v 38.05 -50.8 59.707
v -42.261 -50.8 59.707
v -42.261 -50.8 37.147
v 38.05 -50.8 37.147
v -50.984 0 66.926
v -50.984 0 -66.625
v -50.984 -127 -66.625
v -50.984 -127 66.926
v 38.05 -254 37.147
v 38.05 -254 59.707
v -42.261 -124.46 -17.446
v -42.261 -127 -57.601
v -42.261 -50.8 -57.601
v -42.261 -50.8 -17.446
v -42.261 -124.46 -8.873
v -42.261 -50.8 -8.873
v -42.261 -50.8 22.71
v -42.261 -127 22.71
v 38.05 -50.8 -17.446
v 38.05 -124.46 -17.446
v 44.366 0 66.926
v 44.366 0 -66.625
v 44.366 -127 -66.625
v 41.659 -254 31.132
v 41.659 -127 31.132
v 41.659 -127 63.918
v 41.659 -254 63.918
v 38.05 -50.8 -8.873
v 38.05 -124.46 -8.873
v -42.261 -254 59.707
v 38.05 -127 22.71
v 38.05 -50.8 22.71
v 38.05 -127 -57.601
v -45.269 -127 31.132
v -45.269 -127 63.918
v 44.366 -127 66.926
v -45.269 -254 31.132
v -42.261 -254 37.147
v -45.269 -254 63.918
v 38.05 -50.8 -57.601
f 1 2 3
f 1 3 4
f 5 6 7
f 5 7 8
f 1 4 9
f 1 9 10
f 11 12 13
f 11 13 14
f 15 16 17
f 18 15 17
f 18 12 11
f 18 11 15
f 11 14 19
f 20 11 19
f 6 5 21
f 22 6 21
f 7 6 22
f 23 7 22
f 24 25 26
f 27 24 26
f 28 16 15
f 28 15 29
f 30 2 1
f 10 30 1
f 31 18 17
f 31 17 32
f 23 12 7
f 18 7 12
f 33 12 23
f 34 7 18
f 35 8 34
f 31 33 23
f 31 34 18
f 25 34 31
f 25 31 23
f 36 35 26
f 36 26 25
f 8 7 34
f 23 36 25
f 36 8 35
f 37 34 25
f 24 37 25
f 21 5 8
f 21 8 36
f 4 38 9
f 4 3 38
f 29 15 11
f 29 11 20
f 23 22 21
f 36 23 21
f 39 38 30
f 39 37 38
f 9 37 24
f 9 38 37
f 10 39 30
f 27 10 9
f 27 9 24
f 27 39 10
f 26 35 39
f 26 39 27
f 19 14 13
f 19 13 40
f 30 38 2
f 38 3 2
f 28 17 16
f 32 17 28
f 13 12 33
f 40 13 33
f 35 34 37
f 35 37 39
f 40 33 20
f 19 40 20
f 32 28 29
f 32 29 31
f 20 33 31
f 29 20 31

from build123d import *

# Parameters (mm, degrees)
F0_W     = 95.3502617776
F0_H     = 133.5505247116
F1_DEPTH = 127
F2_W     = 80.3107917309
F2_H     = 22.5592143834
F2_H_2   = 80.3107880056
F3_DEPTH = 76.2
F4_W     = 80.3107917309
F4_H     = 8.5725001991
F5_DEPTH = 73.66
F6_W     = 86.9281552732
F6_H     = 32.7860526741
F6_W_2   = 80.3107917309
F6_H_2   = 22.5592143834
F7_DEPTH = 127


with BuildPart() as f1:
    # F0 (on Front) → F1 (new body)
    with BuildSketch(Plane.XZ):
        with Locations((-3.3086854964, 0.1503974199)):
            Rectangle(F0_W, F0_H)
    extrude(amount=F1_DEPTH)

    # F2 (on face) → F3 (cut)
    with BuildSketch(Plane.XZ.offset(127)):
        with Locations((-2.1055266261, 48.4271068126)):
            Rectangle(F2_W, F2_H)
        with Locations((-2.1055266261, -17.4457896501)):
            Rectangle(F2_W, F2_H_2)
    extrude(amount=-F3_DEPTH, mode=Mode.SUBTRACT)

    # F4 (on face) → F5 (join)
    with BuildSketch(Plane.XZ.offset(50.8)):
        with Locations((-2.1055266261, -13.1595395505)):
            Rectangle(F4_W, F4_H)
    extrude(amount=F5_DEPTH)

    # F6 (on face) → F7 (join)
    with BuildSketch(Plane.XZ.offset(127)):
        with Locations((-1.8047373742, 47.5247371942)):
            Rectangle(F6_W, F6_H)
        with Locations((-2.1055266261, 48.4271068126)):
            Rectangle(F6_W_2, F6_H_2, mode=Mode.SUBTRACT)
    extrude(amount=F7_DEPTH)


solid = f1.part
